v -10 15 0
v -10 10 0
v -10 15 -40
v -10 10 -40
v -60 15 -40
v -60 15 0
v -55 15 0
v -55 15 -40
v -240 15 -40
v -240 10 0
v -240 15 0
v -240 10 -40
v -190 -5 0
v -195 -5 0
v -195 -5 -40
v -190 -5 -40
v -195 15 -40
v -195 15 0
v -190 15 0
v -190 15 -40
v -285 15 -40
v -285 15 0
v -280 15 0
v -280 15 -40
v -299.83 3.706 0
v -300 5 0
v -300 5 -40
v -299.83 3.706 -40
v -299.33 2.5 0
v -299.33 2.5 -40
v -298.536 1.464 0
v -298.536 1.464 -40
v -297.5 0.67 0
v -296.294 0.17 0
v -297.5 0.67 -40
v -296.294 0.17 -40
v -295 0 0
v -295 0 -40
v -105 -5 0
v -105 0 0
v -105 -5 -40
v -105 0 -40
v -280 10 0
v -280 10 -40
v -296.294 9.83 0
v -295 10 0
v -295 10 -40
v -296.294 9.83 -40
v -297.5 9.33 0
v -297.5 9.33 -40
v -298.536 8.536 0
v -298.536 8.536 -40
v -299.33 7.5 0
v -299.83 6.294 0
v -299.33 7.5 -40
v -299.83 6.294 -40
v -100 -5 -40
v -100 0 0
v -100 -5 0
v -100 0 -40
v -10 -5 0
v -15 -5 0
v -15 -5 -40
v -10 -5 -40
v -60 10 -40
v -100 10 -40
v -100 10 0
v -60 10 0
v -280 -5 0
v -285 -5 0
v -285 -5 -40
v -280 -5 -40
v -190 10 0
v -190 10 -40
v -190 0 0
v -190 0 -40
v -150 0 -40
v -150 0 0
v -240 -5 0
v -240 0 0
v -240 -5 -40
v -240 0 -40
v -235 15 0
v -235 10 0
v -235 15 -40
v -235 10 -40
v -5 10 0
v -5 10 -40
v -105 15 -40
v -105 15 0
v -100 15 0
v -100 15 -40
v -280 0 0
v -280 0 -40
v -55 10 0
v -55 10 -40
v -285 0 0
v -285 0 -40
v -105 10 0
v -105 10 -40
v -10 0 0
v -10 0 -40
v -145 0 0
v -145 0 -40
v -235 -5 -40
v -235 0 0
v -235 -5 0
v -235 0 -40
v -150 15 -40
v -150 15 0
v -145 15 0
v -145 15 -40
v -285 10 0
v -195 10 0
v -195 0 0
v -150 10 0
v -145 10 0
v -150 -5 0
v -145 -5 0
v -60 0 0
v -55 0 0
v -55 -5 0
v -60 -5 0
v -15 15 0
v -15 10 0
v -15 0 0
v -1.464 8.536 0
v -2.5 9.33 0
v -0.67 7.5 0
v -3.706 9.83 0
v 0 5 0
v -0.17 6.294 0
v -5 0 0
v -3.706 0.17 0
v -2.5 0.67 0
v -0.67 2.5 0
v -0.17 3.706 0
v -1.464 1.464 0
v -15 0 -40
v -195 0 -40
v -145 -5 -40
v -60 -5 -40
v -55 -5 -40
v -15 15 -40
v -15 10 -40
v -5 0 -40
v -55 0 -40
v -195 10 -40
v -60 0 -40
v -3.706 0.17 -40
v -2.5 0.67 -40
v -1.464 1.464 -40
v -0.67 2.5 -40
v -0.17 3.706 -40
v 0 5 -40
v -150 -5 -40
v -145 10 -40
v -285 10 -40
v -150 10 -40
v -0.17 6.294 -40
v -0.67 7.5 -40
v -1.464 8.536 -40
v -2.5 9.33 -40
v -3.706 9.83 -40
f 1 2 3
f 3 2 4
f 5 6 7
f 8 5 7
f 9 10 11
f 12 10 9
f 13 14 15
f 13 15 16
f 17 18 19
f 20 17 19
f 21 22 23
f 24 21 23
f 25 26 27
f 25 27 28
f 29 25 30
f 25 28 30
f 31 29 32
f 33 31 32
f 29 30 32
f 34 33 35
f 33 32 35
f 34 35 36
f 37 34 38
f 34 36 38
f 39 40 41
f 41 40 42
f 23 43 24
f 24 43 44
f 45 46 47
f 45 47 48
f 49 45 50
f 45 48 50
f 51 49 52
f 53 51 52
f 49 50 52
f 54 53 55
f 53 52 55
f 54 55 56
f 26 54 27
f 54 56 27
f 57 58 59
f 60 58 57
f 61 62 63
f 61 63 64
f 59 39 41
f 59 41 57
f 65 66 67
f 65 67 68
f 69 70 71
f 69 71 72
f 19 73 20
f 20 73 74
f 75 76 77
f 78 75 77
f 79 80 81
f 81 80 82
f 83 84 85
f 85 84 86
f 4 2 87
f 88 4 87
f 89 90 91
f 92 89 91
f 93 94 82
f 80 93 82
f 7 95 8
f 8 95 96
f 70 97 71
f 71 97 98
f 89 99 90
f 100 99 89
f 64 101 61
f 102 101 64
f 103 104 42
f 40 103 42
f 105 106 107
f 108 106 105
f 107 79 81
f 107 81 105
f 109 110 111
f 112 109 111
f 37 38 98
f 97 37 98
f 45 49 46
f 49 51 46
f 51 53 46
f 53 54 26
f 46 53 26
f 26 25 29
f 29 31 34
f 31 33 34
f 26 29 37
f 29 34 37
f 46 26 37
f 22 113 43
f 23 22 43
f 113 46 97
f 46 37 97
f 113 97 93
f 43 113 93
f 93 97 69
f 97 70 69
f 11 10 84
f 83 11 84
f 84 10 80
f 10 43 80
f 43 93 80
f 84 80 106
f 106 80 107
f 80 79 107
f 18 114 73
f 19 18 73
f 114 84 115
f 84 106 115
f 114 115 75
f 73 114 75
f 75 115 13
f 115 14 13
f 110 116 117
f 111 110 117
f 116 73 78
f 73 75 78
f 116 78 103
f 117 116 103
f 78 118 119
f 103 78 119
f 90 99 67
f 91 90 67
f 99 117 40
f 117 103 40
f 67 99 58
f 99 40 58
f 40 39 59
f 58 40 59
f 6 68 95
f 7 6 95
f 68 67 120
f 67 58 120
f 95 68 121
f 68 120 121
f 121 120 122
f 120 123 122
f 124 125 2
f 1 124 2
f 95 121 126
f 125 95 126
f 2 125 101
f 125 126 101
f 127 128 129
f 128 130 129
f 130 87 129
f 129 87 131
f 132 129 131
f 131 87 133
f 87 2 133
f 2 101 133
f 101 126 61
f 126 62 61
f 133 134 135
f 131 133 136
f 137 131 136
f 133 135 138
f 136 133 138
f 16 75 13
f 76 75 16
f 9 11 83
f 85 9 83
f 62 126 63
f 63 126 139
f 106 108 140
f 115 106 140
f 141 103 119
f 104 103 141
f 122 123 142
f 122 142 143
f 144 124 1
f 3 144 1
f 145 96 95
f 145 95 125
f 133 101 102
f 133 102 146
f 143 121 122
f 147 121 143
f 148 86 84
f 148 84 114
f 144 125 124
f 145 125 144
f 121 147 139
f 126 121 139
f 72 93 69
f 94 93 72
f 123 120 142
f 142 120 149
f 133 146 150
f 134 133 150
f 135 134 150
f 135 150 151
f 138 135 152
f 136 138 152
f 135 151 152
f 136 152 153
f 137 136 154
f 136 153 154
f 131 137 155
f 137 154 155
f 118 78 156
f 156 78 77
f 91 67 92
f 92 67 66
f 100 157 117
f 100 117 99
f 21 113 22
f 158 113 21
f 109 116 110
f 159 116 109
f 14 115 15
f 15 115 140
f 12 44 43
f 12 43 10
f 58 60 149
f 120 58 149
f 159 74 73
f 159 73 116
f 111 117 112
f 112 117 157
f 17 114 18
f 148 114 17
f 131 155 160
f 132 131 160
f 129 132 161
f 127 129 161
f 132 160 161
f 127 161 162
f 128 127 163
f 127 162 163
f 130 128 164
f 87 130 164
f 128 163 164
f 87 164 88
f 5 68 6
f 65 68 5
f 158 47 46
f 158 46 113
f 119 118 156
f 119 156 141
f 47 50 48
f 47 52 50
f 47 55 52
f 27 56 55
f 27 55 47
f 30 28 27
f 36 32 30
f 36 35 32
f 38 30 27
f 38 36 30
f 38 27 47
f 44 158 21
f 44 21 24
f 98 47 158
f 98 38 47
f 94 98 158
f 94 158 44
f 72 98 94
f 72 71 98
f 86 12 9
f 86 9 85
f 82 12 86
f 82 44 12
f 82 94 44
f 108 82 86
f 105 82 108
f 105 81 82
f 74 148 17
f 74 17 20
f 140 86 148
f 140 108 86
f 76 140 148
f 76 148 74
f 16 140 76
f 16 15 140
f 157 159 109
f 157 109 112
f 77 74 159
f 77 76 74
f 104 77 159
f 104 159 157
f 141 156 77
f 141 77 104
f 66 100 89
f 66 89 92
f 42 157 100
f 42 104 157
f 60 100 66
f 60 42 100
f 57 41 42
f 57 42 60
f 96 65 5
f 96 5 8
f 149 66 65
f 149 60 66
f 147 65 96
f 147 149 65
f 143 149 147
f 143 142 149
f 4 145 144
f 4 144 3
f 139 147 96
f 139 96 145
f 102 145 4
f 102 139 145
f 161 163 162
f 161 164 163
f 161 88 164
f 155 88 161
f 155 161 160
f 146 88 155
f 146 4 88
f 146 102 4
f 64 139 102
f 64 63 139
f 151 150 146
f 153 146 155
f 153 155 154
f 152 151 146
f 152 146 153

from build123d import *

# Parameters (mm, degrees)
SKETCH1_W           = 300
SKETCH1_H           = 40
BOSS_EXTRUDE1_DEPTH = 10
CUT_EXTRUDE1_DEPTH  = 40
CUT_EXTRUDE2_DEPTH  = 40
SKETCH5_W           = 5
SKETCH5_H           = 40
SKETCH5_W_2         = 2.5
BOSS_EXTRUDE3_DEPTH = 5


with BuildPart() as part:
    # Sketch1 → Boss-Extrude1 (new body)
    with BuildSketch(Plane(origin=(0, 0, 0), x_dir=(1, 0, 0), z_dir=(0, 1, 0))):
        with Locations((-150, 20)):
            Rectangle(SKETCH1_W, SKETCH1_H)
    extrude(amount=BOSS_EXTRUDE1_DEPTH)

    # Sketch2 → Cut-Extrude1 (cut)
    with BuildSketch(Plane(origin=(0, 0, -40), x_dir=(-1, 0, 0), z_dir=(0, 0, -1))):
        with BuildLine():
            Line((0, 10), (0, 5))
            ThreePointArc((0, 5), (1.464466094, 8.535533906), (5, 10))
            Line((5, 10), (0, 10))
        make_face()
        with BuildLine():
            ThreePointArc((5, 0), (1.464466094, 1.464466094), (0, 5))
            Line((0, 5), (0, 0))
            Line((0, 0), (5, 0))
        make_face()
    extrude(amount=-CUT_EXTRUDE1_DEPTH, mode=Mode.SUBTRACT)

    # Sketch4 → Cut-Extrude2 (cut)
    with BuildSketch(Plane(origin=(0, 0, -40), x_dir=(-1, 0, 0), z_dir=(0, 0, -1))):
        with BuildLine():
            Line((300, 10), (295, 10))
            ThreePointArc((295, 10), (298.535533906, 8.535533906), (300, 5))
            Line((300, 5), (300, 10))
        make_face()
        with BuildLine():
            Line((300, 0), (300, 5))
            ThreePointArc((300, 5), (298.535533906, 1.464466094), (295, 0))
            Line((295, 0), (300, 0))
        make_face()
    extrude(amount=-CUT_EXTRUDE2_DEPTH, mode=Mode.SUBTRACT)

    # Sketch5 → Boss-Extrude3 (add)
    with BuildSketch(Plane(origin=(0, 10, 0), x_dir=(1, 0, 0), z_dir=(0, 1, 0))):
        with Locations((-282.5, 20)):
            Rectangle(SKETCH5_W, SKETCH5_H)
        with Locations((-192.5, 20)):
            Rectangle(SKETCH5_W, SKETCH5_H)
        with Locations((-148.75, 20)):
            Rectangle(SKETCH5_W_2, SKETCH5_H)
        with Locations((-146.25, 20)):
            Rectangle(SKETCH5_W_2, SKETCH5_H)
        with Locations((-103.75, 20)):
            Rectangle(SKETCH5_W_2, SKETCH5_H)
        with Locations((-101.25, 20)):
            Rectangle(SKETCH5_W_2, SKETCH5_H)
        with Locations((-58.75, 20)):
            Rectangle(SKETCH5_W_2, SKETCH5_H)
        with Locations((-56.25, 20)):
            Rectangle(SKETCH5_W_2, SKETCH5_H)
        with Locations((-12.5, 20)):
            Rectangle(SKETCH5_W, SKETCH5_H)
        with Locations((-237.5, 20)):
            Rectangle(SKETCH5_W, SKETCH5_H)
    boss_extrude3 = extrude(amount=BOSS_EXTRUDE3_DEPTH)

    # Mirror2: Boss-Extrude3 across plane
    add(boss_extrude3.mirror(Plane.ZX.offset(5)))


solid = part.part
